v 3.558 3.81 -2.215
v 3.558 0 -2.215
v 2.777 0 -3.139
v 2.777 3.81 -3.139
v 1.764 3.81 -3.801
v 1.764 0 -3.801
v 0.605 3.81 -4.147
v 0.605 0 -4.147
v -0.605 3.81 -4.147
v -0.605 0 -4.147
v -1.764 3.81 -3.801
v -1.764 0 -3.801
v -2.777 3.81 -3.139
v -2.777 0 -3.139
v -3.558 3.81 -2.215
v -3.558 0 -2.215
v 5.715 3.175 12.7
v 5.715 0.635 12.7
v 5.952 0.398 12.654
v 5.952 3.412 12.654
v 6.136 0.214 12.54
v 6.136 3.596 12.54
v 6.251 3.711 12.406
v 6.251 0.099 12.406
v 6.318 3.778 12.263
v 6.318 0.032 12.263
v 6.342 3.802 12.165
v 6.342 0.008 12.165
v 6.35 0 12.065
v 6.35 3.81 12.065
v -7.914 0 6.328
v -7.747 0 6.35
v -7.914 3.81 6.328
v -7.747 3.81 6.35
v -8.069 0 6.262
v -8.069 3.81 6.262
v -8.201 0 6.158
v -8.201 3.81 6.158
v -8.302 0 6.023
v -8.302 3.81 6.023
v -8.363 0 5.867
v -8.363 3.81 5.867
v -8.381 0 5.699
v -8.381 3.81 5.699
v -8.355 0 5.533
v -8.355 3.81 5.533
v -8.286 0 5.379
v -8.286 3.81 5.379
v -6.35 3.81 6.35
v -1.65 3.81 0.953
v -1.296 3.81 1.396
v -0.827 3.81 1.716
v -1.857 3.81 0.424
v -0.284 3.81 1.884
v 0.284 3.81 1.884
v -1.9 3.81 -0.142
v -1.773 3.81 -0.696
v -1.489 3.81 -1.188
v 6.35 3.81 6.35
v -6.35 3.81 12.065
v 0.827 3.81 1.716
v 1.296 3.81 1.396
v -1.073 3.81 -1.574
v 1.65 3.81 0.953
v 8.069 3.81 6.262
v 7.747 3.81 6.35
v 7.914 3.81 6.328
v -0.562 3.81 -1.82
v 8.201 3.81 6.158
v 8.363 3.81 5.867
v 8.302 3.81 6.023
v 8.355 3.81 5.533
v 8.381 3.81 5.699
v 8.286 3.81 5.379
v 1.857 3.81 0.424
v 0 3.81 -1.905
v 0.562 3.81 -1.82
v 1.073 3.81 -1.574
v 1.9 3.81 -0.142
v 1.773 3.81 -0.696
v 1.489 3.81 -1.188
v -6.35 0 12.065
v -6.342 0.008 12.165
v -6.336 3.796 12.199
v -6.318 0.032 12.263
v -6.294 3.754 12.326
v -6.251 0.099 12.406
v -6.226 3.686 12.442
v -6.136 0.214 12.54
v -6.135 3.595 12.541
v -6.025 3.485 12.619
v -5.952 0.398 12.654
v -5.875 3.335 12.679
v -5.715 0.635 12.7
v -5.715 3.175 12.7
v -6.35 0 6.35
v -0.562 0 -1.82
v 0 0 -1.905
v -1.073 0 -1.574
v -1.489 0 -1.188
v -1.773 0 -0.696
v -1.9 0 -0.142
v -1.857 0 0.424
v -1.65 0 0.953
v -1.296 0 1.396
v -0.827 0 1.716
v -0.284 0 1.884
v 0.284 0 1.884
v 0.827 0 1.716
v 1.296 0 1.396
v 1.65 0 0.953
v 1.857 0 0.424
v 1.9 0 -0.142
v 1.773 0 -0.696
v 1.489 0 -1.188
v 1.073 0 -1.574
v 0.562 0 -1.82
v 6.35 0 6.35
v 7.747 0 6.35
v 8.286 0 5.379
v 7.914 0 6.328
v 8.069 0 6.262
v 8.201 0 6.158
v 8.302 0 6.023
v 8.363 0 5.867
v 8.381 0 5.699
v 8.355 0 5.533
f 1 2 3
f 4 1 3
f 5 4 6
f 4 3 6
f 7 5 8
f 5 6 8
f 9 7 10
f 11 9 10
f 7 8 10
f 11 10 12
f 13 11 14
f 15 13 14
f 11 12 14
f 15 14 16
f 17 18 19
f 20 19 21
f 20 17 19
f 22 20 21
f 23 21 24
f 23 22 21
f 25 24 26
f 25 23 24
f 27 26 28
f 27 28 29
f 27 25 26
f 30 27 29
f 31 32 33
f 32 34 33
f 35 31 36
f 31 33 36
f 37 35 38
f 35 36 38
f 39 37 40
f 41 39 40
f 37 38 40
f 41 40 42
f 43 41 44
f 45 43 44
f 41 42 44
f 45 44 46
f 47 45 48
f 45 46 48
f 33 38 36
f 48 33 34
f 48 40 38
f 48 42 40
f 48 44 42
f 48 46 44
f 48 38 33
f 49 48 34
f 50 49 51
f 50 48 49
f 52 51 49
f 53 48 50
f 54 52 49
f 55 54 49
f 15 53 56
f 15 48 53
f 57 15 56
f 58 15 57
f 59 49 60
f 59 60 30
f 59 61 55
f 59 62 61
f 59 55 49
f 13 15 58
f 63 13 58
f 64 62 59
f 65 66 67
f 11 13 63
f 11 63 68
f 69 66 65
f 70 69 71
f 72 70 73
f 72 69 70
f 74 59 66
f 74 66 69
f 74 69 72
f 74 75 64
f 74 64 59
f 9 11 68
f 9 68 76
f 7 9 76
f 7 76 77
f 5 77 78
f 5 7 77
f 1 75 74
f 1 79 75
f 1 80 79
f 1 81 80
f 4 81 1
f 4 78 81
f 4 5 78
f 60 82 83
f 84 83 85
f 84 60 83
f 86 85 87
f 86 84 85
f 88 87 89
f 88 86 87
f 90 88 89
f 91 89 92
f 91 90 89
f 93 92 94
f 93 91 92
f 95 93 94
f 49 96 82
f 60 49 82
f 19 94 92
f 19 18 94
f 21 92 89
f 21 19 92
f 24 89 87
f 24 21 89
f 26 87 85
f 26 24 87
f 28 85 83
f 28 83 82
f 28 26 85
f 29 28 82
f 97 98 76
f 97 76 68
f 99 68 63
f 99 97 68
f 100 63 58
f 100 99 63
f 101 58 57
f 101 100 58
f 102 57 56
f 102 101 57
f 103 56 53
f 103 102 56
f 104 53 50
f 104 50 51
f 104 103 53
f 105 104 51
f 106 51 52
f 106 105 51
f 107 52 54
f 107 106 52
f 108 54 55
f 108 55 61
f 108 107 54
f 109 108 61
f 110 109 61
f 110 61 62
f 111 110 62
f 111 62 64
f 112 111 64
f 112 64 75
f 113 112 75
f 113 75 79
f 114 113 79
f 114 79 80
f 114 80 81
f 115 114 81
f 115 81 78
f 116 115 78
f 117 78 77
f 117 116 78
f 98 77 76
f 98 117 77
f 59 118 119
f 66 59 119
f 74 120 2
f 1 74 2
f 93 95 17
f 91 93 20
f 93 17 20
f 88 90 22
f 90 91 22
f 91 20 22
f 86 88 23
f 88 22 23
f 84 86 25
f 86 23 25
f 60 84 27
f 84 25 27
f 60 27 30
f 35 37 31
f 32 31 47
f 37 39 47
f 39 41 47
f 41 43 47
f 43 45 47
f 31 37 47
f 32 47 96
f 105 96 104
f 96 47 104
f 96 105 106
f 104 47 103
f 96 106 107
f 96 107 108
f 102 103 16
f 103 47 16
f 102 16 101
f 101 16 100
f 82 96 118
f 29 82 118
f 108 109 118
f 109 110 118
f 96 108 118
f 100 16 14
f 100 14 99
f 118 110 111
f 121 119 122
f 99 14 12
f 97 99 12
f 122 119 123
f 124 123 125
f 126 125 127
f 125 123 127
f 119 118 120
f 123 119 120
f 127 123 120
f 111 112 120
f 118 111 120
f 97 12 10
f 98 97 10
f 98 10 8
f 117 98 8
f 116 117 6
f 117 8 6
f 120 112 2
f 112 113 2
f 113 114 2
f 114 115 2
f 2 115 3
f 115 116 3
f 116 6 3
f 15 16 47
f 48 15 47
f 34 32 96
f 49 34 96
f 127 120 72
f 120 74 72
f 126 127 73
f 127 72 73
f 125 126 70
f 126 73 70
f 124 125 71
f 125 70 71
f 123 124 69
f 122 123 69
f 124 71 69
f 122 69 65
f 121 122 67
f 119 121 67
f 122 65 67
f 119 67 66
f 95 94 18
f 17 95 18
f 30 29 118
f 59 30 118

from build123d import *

# Parameters (mm, degrees)
SKETCH1_R           = 1.905
BOSS_EXTRUDE1_DEPTH = 3.81
FILLET1_R           = 0.635


with BuildPart() as part:
    # Sketch1 → Boss-Extrude1 (new body)
    with BuildSketch(Plane(origin=(0, 0, 0), x_dir=(1, 0, 0), z_dir=(0, 1, 0))):
        with BuildLine():
            Line((-8.89, -6.35), (-6.35, -6.35))
            Line((-6.35, -6.35), (-6.35, -12.7))
            Line((-6.35, -12.7), (6.35, -12.7))
            Line((6.35, -12.7), (6.35, -6.35))
            Line((6.35, -6.35), (8.89, -6.35))
            Line((8.89, -6.35), (3.557870234, 2.214958328))
            ThreePointArc((3.557870234, 2.214958328), (0, 4.191), (-3.557870234, 2.214958328))
            Line((-3.557870234, 2.214958328), (-8.89, -6.35))
        make_face()
        with Locations(Location((0, 0, 0), (0, 0, 90))):
            Circle(SKETCH1_R, mode=Mode.SUBTRACT)
    extrude(amount=BOSS_EXTRUDE1_DEPTH)

    # Fillet1
    fillet1_edges = [part.edges().sort_by_distance(p)[0] for p in [
        (0, 0, 12.7),
        (8.89, 1.905, 6.35),
        (6.35, 1.905, 12.7),
        (-6.35, 1.905, 12.7),
        (-8.89, 1.905, 6.35),
        (0, 3.81, 12.7),
    ]]
    fillet(fillet1_edges, radius=FILLET1_R)


solid = part.part
